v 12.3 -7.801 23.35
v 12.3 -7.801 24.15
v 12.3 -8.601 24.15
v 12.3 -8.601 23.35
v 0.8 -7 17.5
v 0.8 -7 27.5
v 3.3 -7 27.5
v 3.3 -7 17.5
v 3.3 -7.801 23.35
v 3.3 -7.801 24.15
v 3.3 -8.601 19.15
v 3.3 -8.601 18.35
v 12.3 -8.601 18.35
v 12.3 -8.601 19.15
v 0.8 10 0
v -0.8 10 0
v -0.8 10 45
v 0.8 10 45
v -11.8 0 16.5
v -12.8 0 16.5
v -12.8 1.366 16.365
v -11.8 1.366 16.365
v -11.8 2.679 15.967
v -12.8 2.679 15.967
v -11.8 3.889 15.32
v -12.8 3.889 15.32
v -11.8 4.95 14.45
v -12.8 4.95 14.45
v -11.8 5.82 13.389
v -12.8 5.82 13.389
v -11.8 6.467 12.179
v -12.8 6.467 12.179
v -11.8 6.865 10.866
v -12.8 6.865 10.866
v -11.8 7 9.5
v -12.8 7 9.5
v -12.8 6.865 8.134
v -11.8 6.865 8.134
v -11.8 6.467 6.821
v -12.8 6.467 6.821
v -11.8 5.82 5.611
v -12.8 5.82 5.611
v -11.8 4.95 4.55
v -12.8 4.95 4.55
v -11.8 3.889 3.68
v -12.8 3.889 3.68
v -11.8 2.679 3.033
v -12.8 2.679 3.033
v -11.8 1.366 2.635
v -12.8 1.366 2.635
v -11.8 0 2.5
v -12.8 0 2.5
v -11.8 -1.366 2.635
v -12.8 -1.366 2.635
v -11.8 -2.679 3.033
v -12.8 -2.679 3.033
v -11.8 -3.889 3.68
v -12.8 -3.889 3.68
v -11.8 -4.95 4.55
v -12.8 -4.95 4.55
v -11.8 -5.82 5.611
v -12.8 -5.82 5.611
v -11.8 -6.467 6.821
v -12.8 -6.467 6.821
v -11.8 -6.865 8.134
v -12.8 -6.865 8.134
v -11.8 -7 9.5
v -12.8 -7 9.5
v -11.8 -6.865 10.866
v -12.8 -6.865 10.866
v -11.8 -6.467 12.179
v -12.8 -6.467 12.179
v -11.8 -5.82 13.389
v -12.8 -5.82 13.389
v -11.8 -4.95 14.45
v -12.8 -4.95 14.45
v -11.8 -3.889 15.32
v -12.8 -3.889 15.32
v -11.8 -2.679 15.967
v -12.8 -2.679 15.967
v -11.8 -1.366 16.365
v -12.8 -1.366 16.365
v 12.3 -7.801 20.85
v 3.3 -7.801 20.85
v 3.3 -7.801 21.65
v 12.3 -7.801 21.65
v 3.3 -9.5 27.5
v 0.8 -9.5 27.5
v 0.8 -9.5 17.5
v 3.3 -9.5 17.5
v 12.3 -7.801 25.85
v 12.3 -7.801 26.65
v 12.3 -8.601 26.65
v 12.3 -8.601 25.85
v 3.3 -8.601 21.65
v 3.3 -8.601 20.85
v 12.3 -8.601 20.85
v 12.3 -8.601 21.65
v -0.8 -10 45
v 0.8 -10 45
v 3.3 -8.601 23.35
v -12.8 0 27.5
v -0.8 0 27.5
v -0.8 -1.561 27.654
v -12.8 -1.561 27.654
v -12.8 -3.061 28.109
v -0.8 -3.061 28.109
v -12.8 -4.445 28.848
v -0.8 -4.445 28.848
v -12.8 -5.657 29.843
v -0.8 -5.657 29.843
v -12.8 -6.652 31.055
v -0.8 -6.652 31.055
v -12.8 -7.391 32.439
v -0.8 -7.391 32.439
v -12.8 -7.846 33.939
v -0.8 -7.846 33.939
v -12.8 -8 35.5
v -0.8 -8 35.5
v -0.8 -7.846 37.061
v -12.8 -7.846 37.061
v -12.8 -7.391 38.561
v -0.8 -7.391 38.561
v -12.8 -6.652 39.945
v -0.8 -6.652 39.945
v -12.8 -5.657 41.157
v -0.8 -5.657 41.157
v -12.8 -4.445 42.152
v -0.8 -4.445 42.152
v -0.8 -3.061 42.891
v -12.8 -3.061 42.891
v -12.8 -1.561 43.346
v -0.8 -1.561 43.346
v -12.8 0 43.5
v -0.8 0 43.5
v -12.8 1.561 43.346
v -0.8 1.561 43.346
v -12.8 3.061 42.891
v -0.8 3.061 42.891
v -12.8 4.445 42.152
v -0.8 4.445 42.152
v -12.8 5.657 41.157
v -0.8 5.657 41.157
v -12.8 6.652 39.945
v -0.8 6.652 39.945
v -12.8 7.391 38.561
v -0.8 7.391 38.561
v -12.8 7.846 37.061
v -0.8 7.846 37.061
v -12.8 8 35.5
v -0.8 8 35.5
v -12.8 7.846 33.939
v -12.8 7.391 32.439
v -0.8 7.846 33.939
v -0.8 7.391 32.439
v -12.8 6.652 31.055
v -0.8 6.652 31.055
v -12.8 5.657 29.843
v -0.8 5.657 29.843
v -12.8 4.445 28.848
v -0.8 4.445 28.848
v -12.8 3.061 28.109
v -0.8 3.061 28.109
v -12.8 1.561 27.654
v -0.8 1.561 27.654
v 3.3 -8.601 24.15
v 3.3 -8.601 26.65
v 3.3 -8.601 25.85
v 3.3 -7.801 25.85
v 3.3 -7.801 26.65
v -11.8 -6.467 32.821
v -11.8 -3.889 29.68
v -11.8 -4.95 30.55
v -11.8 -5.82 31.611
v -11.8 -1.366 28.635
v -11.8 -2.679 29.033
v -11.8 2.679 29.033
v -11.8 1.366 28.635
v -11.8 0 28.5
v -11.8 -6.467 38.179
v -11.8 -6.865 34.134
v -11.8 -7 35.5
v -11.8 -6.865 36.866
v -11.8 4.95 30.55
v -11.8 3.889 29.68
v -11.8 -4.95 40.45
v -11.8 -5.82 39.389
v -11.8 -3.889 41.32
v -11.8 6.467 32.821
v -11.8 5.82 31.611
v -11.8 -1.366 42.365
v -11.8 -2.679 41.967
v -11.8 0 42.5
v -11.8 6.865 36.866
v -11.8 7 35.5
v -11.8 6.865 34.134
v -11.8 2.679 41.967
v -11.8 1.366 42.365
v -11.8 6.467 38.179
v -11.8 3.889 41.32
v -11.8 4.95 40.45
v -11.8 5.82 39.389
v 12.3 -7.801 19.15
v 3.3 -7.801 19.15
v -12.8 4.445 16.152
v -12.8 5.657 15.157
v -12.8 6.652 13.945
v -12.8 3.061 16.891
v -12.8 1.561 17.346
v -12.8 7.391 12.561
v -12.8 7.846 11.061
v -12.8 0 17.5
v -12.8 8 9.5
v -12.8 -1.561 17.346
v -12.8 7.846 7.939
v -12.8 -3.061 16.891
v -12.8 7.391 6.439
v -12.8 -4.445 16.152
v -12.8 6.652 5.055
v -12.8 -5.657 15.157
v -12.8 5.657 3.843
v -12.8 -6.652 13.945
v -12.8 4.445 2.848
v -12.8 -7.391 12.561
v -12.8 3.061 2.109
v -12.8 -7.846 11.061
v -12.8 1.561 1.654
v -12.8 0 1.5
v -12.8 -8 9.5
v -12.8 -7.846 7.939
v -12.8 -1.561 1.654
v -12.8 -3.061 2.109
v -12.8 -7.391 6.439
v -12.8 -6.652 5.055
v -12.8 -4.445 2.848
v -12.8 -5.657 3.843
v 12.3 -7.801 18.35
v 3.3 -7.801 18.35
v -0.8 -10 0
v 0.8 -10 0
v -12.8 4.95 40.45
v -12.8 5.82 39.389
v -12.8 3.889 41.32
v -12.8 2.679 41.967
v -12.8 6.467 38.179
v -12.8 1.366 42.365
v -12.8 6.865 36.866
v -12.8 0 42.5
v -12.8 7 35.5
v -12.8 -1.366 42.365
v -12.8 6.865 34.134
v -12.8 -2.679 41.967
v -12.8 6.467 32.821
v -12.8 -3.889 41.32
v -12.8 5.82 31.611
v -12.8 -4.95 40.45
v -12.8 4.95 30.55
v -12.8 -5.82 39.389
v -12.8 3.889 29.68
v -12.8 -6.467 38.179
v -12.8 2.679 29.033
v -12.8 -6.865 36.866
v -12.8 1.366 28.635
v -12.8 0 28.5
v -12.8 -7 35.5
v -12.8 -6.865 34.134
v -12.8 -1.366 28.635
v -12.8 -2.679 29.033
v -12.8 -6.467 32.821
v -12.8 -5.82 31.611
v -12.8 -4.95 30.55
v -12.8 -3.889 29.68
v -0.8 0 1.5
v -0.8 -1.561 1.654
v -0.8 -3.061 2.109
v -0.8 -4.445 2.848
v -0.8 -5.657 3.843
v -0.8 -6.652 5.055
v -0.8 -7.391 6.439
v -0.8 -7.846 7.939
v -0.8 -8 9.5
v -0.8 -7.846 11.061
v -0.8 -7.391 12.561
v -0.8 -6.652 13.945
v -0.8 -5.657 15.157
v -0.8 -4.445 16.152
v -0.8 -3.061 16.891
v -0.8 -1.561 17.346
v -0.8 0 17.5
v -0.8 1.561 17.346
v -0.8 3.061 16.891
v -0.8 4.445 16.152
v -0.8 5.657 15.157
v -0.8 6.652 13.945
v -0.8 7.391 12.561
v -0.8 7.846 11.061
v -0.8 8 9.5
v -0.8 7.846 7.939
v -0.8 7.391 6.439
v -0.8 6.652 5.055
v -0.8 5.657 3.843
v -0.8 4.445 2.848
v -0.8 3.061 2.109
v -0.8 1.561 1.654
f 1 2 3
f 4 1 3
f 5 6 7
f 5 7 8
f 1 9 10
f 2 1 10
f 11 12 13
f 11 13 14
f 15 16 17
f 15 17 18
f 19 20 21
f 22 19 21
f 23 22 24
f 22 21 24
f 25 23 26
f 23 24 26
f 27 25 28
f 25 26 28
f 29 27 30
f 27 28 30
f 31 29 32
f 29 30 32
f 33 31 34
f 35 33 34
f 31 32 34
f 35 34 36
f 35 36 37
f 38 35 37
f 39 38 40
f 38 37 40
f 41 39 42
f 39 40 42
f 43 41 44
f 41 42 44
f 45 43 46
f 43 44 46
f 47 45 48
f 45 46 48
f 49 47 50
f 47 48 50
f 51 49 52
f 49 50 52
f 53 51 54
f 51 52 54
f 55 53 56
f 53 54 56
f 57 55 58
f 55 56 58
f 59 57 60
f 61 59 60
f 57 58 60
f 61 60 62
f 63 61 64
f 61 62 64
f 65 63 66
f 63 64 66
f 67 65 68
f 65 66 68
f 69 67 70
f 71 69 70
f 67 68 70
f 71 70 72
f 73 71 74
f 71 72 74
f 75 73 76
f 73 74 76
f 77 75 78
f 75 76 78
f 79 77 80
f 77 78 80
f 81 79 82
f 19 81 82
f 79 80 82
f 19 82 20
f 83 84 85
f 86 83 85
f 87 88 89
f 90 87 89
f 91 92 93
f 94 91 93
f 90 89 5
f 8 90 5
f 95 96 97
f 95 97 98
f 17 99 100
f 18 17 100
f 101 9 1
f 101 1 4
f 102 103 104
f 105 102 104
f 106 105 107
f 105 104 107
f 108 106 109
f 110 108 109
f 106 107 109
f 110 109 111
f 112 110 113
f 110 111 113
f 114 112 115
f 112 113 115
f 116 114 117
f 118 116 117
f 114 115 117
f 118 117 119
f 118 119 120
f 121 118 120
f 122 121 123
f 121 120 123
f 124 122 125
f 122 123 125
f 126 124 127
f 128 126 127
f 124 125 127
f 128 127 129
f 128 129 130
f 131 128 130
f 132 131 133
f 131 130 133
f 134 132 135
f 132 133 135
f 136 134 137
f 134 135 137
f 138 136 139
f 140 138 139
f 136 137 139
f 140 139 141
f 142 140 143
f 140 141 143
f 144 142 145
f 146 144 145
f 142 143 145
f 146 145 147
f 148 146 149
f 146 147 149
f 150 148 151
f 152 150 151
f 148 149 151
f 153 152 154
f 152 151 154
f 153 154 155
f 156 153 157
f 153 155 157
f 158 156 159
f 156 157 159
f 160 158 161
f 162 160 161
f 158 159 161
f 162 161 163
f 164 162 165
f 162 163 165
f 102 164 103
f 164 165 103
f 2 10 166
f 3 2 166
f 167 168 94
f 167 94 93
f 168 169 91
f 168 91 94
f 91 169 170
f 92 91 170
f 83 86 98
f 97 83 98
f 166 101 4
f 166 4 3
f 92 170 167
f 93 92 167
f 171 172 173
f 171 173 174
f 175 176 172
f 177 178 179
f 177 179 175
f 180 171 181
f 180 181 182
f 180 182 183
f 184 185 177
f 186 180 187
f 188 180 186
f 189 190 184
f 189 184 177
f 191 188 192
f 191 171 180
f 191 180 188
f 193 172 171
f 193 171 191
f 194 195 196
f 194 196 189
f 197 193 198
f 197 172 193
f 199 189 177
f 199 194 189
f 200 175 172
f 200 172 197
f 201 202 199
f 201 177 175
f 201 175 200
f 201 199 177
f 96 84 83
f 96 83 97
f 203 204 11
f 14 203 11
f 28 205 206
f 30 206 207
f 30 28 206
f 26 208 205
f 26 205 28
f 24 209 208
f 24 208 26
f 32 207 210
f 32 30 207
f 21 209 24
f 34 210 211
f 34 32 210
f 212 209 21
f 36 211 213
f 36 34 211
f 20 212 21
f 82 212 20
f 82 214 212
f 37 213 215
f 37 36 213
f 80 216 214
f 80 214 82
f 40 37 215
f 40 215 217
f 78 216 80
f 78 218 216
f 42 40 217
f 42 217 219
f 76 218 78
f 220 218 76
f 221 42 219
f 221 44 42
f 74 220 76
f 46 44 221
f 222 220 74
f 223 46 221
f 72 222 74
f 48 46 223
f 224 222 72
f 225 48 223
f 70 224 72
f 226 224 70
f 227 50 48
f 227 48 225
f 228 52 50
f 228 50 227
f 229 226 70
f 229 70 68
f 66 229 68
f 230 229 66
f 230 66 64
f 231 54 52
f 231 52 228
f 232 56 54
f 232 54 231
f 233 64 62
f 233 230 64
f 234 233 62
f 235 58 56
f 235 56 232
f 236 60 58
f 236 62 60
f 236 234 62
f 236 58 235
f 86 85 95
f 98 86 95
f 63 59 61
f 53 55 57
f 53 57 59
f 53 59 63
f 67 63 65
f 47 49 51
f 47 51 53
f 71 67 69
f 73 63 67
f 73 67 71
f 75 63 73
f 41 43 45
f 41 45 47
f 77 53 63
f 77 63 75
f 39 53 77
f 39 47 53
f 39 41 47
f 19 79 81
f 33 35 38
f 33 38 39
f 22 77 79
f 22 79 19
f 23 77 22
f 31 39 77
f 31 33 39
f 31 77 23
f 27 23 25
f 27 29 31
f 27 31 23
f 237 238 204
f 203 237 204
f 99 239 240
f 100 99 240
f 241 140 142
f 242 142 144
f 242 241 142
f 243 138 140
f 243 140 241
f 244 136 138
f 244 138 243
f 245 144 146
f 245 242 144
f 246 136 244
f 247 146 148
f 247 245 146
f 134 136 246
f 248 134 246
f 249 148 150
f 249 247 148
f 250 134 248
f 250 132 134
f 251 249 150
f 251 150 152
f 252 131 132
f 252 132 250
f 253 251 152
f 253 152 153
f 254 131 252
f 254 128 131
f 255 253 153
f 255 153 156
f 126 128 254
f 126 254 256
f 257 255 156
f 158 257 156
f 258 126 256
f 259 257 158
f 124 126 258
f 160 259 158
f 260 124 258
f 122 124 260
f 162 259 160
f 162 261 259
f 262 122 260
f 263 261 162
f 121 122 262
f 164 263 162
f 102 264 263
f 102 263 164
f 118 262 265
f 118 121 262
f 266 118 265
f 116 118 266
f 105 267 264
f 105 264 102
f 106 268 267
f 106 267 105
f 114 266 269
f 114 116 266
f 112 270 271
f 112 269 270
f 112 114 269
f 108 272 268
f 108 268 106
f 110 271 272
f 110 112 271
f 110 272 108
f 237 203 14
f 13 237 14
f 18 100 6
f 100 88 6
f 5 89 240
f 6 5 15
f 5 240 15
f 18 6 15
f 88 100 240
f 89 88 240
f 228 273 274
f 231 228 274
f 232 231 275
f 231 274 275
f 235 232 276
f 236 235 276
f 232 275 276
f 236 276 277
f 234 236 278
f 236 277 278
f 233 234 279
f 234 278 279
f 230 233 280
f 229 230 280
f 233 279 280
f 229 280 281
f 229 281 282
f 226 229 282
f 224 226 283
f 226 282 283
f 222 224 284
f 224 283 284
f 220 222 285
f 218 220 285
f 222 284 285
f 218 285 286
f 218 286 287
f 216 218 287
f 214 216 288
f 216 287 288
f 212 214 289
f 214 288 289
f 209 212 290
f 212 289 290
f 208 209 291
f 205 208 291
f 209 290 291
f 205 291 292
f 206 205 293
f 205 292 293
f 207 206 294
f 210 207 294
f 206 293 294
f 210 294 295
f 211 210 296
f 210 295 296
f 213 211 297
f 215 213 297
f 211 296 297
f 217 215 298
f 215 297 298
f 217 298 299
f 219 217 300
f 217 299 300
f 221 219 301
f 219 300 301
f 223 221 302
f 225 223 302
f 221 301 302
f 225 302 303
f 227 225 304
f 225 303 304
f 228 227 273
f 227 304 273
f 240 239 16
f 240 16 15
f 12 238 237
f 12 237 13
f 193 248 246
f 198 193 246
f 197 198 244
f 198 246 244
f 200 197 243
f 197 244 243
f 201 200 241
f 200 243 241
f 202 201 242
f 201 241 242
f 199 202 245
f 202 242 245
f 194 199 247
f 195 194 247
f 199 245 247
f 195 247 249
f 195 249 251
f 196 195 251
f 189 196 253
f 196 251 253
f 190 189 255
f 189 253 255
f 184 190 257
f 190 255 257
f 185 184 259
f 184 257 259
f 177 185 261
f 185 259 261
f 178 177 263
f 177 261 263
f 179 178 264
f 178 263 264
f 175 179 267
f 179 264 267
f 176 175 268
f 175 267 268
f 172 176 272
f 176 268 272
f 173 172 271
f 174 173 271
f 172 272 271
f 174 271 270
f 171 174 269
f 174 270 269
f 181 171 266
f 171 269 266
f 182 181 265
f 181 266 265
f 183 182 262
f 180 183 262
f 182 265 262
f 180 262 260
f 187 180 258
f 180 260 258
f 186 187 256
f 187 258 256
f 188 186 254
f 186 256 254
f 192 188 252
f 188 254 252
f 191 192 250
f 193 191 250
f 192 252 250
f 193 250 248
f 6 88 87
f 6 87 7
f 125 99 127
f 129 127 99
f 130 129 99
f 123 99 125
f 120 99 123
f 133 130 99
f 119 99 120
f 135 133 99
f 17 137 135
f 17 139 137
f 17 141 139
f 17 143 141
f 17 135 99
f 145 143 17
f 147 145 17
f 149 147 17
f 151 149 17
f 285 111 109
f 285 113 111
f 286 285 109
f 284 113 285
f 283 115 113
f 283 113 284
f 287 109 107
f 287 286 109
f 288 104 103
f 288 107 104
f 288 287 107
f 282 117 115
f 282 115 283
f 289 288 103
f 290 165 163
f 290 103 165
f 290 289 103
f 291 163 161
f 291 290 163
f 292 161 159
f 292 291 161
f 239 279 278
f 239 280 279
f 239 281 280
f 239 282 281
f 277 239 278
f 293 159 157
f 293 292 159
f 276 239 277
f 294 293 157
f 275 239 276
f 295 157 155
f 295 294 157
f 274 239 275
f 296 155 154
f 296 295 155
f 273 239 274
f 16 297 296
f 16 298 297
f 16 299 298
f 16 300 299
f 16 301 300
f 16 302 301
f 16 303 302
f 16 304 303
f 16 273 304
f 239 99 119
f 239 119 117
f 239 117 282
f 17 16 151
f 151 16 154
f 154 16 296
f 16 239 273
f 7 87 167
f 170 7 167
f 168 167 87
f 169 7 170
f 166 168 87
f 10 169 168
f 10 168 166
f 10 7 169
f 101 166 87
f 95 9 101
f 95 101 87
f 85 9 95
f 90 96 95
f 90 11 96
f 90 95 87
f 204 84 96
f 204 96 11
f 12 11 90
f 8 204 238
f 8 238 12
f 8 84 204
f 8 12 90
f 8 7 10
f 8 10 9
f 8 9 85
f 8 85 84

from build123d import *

# Parameters (mm, degrees)
SKETCH1_W           = 1.6
SKETCH1_H           = 20
BOSS_EXTRUDE1_DEPTH = 45
SKETCH2_W           = 10
SKETCH2_H           = 2.5
BOSS_EXTRUDE2_DEPTH = 2.5
SKETCH3_W           = 0.8
SKETCH3_H           = 0.8
BOSS_EXTRUDE3_DEPTH = 9
SKETCH4_R           = 8
BOSS_EXTRUDE4_DEPTH = 12
SKETCH5_R           = 7
CUT_EXTRUDE1_DEPTH  = 1


with BuildPart() as part:
    # Sketch1 → Boss-Extrude1 (new body)
    with BuildSketch(Plane.XY):
        Rectangle(SKETCH1_W, SKETCH1_H)
    extrude(amount=BOSS_EXTRUDE1_DEPTH)

    # Sketch2 → Boss-Extrude2 (add)
    with BuildSketch(Plane(origin=(0.8, 0, 0), x_dir=(0, 0, -1), z_dir=(1, 0, 0))):
        with Locations((-22.5, -8.25)):
            Rectangle(SKETCH2_W, SKETCH2_H)
    extrude(amount=BOSS_EXTRUDE2_DEPTH)

    # Sketch3 → Boss-Extrude3 (add)
    with BuildSketch(Plane(origin=(3.3, -6.2, 0), x_dir=(0, -1, 0), z_dir=(-1, 0, 0))):
        with Locations((2.000946282, 26.25)):
            Rectangle(SKETCH3_W, SKETCH3_H)
        with Locations((2.000946282, 23.75)):
            Rectangle(SKETCH3_W, SKETCH3_H)
        with Locations((2.000946282, 21.25)):
            Rectangle(SKETCH3_W, SKETCH3_H)
        with Locations((2.000946282, 18.75)):
            Rectangle(SKETCH3_W, SKETCH3_H)
    extrude(amount=-BOSS_EXTRUDE3_DEPTH)

    # Sketch4 → Boss-Extrude4 (add)
    with BuildSketch(Plane.ZY.offset(0.8)):
        with Locations(Location((9.5, 0, 0), (0, 0, 180))):
            Circle(SKETCH4_R)
        with Locations(Location((35.5, 0, 0), (0, 0, 180))):
            Circle(SKETCH4_R)
    extrude(amount=BOSS_EXTRUDE4_DEPTH)

    # Sketch5 → Cut-Extrude1 (cut)
    with BuildSketch(Plane.ZY.offset(12.8)):
        with Locations((35.5, 0)):
            Circle(SKETCH5_R)
        with Locations((9.5, 0)):
            Circle(SKETCH5_R)
    extrude(amount=-CUT_EXTRUDE1_DEPTH, mode=Mode.SUBTRACT)


solid = part.part
